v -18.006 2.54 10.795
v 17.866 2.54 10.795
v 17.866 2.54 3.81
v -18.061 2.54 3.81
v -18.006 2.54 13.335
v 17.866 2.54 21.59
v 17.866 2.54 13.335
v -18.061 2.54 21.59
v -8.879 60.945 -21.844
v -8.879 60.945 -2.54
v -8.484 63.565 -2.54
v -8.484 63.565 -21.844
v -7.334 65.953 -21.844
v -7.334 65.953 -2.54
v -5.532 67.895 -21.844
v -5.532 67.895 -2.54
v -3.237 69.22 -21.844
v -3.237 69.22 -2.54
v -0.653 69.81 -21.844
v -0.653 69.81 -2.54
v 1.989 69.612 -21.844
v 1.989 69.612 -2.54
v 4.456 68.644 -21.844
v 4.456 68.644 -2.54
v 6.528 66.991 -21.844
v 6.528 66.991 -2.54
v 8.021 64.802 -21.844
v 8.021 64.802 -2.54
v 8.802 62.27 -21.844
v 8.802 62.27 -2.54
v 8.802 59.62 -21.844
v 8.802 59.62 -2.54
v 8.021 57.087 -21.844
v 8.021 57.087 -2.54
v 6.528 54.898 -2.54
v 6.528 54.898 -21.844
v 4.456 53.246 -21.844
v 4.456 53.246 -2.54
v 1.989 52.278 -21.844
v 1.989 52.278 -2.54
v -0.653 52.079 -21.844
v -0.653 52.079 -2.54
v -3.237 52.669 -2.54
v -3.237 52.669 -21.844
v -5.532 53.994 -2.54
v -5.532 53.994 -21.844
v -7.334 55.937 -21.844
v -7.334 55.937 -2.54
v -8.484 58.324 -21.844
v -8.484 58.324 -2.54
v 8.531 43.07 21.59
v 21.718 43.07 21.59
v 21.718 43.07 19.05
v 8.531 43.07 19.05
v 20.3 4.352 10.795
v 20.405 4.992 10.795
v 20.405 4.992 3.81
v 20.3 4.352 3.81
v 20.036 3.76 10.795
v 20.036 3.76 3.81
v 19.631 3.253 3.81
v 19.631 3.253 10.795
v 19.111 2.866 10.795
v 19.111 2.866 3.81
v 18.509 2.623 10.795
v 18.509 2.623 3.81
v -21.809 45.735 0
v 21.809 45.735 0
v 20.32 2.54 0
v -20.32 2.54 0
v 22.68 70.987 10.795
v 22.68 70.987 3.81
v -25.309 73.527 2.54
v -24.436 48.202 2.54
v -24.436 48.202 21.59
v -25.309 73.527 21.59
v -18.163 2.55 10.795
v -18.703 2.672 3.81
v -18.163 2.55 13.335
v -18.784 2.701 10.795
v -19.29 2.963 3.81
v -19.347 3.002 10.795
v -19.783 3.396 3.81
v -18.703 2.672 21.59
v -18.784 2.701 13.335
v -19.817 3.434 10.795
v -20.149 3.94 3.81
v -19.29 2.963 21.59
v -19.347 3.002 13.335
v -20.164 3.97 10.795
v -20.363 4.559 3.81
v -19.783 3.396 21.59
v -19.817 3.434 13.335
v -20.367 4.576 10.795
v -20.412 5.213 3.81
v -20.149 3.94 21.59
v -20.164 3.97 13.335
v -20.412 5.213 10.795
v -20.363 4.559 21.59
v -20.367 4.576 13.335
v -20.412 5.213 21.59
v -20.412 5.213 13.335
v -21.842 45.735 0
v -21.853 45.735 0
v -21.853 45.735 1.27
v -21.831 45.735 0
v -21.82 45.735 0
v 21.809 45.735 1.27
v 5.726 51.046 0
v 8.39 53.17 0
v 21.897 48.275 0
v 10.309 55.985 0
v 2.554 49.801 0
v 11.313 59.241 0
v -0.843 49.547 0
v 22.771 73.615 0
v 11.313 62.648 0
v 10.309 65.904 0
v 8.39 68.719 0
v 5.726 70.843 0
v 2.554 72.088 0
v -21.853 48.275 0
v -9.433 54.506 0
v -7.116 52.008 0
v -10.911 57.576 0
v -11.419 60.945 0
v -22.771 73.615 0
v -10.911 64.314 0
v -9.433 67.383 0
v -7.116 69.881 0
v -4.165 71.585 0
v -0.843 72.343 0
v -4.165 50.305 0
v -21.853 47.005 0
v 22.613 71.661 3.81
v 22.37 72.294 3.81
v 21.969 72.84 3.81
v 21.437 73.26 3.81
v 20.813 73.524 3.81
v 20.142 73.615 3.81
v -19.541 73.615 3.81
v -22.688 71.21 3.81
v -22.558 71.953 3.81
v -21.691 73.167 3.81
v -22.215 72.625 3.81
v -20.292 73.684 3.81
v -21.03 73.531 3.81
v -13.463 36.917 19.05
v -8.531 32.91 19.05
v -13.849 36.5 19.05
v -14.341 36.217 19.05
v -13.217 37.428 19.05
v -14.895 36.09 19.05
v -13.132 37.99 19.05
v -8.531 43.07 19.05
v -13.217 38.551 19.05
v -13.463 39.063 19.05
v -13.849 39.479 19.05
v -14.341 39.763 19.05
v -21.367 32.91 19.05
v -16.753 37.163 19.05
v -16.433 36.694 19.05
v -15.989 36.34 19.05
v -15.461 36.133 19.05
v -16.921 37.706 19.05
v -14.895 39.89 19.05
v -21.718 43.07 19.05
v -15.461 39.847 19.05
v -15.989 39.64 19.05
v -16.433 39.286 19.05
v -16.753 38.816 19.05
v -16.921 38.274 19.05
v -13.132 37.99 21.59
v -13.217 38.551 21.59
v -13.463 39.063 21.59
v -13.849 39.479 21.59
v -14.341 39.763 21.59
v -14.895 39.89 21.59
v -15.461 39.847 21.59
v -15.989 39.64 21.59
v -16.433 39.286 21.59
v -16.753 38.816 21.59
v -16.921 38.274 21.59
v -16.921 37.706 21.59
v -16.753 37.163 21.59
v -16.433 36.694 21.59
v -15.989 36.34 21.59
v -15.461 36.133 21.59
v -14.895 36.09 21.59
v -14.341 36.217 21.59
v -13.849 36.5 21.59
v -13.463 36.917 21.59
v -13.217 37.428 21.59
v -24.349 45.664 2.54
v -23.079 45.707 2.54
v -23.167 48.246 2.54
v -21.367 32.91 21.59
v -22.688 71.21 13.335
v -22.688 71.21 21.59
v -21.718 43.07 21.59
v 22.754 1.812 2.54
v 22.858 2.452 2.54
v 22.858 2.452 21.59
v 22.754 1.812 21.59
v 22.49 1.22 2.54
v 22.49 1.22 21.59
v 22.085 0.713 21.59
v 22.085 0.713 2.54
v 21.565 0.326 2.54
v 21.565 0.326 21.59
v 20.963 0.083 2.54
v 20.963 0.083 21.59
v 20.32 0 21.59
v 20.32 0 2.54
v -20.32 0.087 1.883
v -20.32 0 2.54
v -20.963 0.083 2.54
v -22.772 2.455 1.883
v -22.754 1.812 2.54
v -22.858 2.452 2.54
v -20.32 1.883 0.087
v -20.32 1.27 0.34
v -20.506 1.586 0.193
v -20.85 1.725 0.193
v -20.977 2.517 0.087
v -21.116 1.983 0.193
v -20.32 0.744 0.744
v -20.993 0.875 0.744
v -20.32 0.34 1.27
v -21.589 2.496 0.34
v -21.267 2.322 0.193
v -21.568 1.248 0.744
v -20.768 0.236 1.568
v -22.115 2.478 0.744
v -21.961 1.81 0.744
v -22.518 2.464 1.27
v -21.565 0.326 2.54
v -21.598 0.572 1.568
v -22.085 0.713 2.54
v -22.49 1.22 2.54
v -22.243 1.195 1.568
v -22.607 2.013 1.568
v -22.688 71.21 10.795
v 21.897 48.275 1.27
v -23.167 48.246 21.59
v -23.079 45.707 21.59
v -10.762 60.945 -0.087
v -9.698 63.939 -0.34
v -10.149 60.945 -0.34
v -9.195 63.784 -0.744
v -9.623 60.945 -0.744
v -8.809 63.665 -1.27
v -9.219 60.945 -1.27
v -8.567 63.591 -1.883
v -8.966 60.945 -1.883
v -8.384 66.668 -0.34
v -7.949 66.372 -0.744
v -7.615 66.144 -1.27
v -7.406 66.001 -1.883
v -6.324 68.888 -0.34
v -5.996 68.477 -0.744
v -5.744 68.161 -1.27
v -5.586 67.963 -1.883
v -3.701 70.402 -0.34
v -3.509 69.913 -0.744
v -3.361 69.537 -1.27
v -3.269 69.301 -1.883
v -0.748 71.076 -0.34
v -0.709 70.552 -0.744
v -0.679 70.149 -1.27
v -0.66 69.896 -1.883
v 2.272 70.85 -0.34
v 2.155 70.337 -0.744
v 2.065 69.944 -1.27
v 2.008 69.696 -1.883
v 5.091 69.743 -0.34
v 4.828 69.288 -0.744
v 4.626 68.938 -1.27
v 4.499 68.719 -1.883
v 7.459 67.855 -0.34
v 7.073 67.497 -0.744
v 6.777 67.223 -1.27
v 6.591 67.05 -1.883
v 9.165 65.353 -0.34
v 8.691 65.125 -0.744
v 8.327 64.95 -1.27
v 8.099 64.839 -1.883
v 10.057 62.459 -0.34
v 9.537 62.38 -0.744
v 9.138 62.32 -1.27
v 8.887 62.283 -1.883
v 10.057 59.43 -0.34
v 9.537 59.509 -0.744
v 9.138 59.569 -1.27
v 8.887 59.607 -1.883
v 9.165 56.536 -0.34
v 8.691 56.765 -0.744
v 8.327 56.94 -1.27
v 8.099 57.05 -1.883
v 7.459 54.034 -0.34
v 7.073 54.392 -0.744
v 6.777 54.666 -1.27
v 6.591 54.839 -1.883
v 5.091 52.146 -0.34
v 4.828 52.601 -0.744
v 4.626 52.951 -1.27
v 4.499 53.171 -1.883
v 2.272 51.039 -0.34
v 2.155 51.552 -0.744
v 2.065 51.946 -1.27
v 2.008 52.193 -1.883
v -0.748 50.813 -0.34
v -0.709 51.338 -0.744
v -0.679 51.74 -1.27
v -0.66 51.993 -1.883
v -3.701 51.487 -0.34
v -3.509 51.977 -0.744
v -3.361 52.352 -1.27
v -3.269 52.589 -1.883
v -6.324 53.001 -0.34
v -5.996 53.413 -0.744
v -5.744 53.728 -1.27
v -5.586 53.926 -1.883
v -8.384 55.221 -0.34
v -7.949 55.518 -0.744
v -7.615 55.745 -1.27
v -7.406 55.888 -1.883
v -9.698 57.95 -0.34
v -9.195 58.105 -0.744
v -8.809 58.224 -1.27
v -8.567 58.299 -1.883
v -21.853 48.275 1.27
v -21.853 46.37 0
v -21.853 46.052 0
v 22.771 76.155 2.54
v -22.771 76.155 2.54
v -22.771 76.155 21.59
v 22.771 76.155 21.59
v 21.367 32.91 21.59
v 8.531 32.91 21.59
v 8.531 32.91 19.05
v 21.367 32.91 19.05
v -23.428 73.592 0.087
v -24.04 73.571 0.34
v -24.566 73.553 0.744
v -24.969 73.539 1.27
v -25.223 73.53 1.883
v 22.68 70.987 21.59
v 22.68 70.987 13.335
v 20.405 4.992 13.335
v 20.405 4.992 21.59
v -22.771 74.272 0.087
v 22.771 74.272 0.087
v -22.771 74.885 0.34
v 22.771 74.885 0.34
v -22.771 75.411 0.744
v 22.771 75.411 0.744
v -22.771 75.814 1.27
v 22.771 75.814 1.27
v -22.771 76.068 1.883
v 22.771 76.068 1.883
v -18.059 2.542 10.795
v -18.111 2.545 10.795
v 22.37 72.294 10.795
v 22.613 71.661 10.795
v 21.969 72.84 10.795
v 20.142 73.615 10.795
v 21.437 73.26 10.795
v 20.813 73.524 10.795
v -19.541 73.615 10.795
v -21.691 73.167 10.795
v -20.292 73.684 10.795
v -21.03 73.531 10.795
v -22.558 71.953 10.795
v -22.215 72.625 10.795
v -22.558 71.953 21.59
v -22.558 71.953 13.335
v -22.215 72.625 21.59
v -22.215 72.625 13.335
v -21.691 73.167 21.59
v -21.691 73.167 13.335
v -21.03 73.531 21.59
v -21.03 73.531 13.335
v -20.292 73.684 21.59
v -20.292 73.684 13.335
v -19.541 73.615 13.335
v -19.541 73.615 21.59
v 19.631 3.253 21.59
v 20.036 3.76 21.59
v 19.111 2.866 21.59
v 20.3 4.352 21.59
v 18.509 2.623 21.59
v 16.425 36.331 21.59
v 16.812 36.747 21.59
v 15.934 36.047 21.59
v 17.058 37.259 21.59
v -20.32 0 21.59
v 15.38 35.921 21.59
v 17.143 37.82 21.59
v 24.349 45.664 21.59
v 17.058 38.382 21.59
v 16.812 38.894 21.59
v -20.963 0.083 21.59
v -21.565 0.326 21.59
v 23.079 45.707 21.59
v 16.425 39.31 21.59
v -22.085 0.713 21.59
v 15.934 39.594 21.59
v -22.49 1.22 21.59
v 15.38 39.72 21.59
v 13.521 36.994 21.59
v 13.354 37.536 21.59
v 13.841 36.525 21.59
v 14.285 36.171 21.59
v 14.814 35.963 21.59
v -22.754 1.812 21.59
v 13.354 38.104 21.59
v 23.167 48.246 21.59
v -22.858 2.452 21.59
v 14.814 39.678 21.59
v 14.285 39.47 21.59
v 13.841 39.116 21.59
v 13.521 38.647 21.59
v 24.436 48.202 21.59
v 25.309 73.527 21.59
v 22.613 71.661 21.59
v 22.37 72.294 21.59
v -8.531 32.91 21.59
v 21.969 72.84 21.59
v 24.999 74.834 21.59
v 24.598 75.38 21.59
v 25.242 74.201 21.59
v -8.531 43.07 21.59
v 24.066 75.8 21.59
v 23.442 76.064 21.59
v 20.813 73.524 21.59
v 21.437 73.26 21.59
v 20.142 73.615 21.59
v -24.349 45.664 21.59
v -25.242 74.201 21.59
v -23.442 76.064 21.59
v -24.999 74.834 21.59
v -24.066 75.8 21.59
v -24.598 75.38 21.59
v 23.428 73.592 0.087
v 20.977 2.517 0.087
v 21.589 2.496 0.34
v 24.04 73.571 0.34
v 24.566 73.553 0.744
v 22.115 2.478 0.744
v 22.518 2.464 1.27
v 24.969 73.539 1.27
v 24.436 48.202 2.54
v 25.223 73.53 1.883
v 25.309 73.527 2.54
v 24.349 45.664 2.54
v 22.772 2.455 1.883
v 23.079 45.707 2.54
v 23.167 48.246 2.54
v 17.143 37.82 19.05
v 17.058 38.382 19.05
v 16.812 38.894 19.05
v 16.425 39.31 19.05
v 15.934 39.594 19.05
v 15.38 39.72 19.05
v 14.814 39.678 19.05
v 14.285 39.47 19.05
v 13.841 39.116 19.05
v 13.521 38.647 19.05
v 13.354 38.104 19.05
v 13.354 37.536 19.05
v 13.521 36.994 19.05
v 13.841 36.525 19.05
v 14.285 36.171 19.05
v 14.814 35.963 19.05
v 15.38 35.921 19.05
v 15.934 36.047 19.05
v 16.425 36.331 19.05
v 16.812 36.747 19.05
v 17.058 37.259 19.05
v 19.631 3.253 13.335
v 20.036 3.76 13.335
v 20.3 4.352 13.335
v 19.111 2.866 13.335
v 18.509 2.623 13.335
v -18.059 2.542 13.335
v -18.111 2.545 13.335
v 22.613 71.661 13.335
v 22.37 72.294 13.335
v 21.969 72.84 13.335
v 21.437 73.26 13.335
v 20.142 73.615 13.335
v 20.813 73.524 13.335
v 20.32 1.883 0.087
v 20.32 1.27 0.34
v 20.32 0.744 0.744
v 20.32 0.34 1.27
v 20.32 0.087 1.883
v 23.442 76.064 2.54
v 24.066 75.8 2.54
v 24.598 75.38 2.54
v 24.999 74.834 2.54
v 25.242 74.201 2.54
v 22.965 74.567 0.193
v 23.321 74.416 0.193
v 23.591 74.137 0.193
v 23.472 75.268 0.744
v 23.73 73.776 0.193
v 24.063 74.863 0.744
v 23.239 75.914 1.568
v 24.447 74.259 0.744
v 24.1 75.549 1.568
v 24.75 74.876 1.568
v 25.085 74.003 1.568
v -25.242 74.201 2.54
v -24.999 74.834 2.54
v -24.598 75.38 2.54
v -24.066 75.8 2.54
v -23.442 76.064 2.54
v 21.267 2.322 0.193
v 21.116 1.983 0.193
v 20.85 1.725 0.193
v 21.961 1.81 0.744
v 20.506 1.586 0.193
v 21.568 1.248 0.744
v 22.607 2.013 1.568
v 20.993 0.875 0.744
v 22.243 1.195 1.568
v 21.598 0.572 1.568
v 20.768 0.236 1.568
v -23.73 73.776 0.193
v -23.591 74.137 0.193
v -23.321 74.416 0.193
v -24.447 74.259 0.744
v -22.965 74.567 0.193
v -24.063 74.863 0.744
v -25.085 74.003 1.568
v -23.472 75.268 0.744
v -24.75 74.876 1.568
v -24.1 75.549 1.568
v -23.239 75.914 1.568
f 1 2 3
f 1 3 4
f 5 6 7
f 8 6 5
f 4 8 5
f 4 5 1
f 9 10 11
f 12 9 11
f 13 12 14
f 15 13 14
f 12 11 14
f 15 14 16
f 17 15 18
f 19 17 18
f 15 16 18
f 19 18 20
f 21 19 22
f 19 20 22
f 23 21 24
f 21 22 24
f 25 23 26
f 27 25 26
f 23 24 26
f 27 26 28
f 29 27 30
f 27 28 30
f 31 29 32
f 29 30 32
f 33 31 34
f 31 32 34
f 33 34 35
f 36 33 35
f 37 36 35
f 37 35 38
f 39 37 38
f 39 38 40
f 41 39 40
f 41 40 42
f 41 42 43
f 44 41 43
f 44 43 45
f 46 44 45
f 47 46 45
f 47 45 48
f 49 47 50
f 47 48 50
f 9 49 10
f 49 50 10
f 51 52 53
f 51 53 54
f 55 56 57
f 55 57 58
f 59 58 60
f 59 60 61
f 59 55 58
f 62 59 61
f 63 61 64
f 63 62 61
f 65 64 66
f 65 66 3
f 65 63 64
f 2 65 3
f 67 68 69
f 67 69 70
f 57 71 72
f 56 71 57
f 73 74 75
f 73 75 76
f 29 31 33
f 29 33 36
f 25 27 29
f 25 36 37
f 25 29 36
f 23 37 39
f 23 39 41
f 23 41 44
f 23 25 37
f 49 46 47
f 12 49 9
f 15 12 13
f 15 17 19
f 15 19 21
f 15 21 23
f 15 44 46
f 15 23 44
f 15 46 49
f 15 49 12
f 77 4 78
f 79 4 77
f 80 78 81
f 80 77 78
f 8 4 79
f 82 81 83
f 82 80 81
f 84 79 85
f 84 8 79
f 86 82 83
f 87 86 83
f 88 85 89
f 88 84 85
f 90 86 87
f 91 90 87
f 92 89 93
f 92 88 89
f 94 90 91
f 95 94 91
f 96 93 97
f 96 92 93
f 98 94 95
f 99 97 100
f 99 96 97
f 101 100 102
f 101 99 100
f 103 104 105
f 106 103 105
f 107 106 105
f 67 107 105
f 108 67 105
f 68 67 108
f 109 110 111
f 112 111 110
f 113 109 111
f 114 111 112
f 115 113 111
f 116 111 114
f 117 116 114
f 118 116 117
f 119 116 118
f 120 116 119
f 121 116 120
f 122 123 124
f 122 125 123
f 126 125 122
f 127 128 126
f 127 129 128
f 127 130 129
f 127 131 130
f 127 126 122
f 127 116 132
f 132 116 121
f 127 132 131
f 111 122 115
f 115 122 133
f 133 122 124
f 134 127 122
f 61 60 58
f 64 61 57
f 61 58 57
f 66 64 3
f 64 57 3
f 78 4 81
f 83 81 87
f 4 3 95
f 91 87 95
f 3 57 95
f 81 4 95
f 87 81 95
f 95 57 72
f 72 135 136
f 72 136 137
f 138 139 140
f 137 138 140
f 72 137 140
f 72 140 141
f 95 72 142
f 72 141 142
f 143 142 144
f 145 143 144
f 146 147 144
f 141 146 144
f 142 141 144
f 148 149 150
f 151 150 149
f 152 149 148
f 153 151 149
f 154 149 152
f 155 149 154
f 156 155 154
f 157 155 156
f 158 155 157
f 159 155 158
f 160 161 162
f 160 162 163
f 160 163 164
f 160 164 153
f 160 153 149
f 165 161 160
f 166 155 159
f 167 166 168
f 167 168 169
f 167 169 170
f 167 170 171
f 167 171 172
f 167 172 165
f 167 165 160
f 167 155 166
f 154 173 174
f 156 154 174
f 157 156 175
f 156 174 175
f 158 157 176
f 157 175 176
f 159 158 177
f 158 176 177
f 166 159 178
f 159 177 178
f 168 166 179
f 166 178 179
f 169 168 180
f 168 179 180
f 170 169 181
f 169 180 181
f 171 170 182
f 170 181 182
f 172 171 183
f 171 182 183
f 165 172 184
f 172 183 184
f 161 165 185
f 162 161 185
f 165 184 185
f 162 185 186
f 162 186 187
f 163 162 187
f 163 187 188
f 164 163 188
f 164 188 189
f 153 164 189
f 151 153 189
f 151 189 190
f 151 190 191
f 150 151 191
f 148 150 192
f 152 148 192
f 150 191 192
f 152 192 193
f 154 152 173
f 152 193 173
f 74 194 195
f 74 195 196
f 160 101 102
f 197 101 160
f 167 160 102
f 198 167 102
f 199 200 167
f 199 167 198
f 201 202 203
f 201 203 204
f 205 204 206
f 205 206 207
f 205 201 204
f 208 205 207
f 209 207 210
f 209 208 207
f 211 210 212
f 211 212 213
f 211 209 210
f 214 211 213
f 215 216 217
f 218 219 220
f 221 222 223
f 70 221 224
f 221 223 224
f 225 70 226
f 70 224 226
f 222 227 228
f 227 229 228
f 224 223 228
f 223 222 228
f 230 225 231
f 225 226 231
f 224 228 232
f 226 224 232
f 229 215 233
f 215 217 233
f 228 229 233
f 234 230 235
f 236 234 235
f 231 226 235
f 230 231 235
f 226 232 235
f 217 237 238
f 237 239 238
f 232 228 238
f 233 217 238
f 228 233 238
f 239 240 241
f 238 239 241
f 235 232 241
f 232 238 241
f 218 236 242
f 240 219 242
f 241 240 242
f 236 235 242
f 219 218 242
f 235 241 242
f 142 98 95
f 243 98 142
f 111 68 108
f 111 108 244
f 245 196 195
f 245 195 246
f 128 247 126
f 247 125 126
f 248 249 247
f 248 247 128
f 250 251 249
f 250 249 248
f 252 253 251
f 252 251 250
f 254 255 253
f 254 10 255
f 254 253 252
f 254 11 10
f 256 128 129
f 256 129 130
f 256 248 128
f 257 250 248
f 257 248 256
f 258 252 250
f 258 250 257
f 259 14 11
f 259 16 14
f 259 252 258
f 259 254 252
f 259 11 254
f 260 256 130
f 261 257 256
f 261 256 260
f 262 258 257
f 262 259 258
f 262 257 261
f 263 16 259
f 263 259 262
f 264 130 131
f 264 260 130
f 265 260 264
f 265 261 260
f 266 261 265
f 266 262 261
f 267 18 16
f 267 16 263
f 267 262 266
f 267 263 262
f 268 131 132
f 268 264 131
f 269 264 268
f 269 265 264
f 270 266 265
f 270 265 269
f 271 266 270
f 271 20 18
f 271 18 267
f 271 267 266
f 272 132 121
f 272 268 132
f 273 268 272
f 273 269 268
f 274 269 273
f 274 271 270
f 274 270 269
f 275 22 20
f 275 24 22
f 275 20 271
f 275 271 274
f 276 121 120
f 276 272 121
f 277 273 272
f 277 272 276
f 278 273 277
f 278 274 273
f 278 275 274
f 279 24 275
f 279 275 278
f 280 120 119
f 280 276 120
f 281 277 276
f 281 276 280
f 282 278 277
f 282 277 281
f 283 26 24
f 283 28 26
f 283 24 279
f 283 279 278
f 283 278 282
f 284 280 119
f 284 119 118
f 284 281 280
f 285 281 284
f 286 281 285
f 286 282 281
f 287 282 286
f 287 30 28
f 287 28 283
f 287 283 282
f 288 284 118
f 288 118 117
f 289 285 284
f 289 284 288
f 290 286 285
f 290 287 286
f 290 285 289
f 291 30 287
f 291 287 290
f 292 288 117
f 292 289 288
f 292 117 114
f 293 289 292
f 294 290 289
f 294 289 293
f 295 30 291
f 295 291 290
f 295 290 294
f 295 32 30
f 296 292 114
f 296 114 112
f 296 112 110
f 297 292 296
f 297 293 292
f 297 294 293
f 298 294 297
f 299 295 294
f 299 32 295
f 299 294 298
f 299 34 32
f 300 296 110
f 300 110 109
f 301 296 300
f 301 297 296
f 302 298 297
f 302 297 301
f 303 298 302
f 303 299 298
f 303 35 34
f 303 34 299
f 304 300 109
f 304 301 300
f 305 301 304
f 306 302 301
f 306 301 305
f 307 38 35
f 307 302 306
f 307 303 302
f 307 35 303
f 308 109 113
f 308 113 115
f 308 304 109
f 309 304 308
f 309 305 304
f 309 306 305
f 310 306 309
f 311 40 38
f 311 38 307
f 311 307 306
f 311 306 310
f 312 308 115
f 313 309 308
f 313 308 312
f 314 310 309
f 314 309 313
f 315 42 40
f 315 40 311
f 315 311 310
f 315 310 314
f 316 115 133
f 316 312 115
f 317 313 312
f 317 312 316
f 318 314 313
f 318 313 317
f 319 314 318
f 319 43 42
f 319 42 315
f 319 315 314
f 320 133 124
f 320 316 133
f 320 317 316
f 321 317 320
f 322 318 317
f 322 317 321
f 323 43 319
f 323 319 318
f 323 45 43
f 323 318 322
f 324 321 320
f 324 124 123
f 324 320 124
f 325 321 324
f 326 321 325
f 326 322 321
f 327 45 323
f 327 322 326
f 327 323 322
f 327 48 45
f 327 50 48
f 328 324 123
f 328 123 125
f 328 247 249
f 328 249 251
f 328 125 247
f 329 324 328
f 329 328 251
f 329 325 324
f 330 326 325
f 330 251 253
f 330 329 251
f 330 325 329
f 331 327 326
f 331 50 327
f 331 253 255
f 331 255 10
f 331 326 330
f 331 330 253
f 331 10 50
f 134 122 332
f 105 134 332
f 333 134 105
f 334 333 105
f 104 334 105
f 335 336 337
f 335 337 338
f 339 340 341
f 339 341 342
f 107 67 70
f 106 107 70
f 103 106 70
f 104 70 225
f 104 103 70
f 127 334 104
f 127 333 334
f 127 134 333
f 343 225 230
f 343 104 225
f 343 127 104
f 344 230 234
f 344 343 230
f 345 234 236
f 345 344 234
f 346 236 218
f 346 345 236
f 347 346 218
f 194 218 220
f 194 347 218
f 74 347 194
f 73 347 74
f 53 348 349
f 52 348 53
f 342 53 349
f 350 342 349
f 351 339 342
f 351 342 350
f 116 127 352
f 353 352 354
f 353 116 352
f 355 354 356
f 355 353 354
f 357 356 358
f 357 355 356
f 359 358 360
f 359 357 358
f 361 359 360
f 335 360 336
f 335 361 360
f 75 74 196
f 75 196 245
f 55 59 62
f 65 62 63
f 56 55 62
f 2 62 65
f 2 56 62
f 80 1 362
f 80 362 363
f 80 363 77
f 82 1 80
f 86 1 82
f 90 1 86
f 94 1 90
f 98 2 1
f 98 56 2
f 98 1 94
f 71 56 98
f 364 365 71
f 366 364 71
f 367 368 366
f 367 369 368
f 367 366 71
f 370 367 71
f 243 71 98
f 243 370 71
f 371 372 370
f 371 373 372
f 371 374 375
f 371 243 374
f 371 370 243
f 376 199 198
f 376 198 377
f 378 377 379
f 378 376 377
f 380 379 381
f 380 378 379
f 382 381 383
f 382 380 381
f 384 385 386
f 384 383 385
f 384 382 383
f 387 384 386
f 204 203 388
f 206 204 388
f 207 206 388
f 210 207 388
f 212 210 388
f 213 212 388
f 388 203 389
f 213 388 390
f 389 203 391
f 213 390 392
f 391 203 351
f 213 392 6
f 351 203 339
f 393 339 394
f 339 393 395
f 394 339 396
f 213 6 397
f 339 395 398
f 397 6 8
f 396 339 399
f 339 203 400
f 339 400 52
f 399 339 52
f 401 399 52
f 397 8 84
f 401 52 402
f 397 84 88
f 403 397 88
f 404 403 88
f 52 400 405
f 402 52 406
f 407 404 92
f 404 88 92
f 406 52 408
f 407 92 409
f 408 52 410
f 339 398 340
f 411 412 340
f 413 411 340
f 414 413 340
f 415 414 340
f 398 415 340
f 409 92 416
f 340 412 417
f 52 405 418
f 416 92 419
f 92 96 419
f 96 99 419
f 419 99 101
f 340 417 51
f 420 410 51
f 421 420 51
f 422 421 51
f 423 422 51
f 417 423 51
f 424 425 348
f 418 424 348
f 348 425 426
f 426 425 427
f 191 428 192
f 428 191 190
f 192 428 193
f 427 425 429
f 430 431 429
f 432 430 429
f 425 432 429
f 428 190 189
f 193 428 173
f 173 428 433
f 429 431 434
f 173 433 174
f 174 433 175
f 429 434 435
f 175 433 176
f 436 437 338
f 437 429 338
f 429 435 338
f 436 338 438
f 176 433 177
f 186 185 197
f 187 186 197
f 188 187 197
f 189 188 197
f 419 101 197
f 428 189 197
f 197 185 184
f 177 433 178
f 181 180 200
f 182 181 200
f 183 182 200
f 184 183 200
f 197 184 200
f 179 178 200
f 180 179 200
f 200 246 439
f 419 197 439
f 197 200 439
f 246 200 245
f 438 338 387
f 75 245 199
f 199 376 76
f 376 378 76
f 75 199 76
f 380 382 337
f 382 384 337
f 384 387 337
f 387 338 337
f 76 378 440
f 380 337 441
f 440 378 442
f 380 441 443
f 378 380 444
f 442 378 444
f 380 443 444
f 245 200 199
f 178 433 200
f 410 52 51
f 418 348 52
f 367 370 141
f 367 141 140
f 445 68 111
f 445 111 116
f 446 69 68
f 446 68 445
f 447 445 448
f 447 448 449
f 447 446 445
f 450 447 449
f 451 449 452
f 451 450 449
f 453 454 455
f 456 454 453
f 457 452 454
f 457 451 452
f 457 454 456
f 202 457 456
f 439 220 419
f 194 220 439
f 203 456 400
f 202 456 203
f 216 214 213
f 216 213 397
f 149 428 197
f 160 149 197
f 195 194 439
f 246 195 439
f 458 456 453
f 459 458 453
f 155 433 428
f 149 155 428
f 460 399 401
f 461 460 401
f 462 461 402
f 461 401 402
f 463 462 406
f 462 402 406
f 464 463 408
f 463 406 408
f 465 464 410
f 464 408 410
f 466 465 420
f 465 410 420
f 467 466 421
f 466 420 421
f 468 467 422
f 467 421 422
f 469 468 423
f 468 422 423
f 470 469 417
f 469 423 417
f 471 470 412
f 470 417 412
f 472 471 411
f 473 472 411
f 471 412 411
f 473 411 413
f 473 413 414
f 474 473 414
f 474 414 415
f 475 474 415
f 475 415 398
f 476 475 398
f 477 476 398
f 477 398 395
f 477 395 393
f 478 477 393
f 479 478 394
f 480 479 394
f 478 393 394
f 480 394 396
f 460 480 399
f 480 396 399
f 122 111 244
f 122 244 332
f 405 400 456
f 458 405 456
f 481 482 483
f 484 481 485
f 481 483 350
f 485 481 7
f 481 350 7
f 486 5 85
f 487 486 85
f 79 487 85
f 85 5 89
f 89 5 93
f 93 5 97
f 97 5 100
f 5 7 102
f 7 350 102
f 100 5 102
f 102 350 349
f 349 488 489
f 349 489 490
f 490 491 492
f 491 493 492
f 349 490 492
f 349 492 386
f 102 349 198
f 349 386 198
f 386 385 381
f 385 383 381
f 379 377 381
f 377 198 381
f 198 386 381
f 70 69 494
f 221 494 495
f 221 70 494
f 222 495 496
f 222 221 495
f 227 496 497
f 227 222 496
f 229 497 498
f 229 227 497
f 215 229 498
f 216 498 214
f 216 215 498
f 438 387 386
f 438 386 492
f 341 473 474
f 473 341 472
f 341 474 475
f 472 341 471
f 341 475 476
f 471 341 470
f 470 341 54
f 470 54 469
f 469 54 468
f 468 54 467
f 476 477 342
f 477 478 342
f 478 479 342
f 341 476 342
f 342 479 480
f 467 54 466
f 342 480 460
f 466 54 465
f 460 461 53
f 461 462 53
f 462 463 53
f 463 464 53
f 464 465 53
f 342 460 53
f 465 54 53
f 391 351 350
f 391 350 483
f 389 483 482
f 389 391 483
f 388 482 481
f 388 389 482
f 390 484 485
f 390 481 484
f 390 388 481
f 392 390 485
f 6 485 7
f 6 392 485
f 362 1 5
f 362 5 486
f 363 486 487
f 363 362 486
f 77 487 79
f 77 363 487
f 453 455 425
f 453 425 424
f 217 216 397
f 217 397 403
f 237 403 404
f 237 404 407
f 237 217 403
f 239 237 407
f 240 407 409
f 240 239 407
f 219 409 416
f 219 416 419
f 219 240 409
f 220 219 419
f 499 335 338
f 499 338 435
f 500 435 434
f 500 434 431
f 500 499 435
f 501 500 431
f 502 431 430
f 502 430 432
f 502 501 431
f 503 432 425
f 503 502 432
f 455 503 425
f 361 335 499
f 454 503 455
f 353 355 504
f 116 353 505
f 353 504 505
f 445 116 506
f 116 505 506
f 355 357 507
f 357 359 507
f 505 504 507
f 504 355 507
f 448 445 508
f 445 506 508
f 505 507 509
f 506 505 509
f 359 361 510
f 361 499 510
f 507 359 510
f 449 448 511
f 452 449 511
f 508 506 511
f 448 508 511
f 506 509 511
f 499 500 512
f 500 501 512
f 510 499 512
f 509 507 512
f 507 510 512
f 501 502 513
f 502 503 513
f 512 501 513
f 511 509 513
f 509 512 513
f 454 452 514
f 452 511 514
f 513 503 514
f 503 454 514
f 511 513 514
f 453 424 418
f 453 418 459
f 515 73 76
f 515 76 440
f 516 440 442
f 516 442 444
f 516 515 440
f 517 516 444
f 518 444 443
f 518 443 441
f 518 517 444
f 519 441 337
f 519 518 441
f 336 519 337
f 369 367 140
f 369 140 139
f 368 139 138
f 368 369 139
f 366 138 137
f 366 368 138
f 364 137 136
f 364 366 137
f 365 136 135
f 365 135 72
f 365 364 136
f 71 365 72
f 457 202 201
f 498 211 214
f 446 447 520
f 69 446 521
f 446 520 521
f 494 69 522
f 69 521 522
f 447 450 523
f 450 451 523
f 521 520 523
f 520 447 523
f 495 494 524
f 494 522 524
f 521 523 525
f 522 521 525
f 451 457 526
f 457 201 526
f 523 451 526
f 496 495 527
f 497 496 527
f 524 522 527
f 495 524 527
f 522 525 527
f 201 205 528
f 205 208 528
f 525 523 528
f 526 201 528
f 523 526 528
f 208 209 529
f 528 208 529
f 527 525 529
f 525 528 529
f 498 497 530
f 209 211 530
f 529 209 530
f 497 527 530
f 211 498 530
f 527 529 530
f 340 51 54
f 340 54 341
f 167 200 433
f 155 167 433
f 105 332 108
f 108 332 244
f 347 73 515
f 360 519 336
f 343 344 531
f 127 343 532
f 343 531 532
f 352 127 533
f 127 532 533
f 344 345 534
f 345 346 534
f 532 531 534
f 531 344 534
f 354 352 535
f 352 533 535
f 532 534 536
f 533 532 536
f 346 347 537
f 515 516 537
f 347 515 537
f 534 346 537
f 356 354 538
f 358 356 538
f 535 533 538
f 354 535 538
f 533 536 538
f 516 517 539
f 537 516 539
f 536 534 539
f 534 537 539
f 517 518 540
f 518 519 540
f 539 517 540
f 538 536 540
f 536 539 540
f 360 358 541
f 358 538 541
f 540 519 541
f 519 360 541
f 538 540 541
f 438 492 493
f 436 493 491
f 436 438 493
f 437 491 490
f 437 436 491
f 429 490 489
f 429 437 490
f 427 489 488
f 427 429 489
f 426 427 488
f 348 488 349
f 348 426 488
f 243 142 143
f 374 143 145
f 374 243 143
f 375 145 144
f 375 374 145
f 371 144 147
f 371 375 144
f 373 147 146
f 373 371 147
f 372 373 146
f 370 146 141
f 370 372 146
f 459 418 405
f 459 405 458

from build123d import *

# Parameters (mm, degrees)
BOSS_EXTRUDE2_DEPTH = 21.59
CUT_EXTRUDE1_DEPTH  = 17.78
BOSS_EXTRUDE4_DEPTH = 2.54
SKETCH8_R           = 1.905
CUT_EXTRUDE2_DEPTH  = 2.54
BOSS_EXTRUDE6_DEPTH = 2.54
FILLET1_R           = 2.54
SKETCH13_W          = 19.05
SKETCH13_H          = 2.54
CUT_EXTRUDE5_DEPTH  = 1.27
CUT_EXTRUDE6_DEPTH  = 1.27
SKETCH16_W          = 19.05
SKETCH16_H          = 2.54
CUT_EXTRUDE7_DEPTH  = 1.27
SKETCH17_R          = 8.89
BOSS_EXTRUDE7_DEPTH = 21.844
FILLET2_R           = 2.54


with BuildPart() as part:
    # Sketch3 → Boss-Extrude2 (new body)
    with BuildSketch(Plane.XY):
        with BuildLine():
            Line((-22.77090231, 76.154735329), (22.77090231, 76.154735329))
            ThreePointArc((22.77090231, 76.154735329), (24.597640016, 75.379566583), (25.309393487, 73.527199387))
            Line((25.309393487, 73.527199387), (22.858491178, 2.452464058))
            ThreePointArc((22.858491178, 2.452464058), (22.084831254, 0.713262294), (20.32, 0))
            Line((20.32, 0), (-20.32, 0))
            ThreePointArc((-20.32, 0), (-22.084831254, 0.713262294), (-22.858491178, 2.452464058))
            Line((-22.858491178, 2.452464058), (-25.309393487, 73.527199387))
            ThreePointArc((-25.309393487, 73.527199387), (-24.597640016, 75.379566583), (-22.77090231, 76.154735329))
        make_face()
    extrude(amount=BOSS_EXTRUDE2_DEPTH)

    # Sketch4 → Cut-Extrude1 (cut)
    with BuildSketch(Plane.XY.offset(21.59)):
        with BuildLine():
            Line((-19.541270744, 73.614735329), (20.141804619, 73.614735329))
            ThreePointArc((20.141804619, 73.614735329), (21.968542325, 72.839566583), (22.680295797, 70.987199387))
            Line((22.680295797, 70.987199387), (20.404569365, 4.992462187))
            ThreePointArc((20.404569365, 4.992462187), (19.630909441, 3.253260423), (17.866078187, 2.539998129))
            Line((17.866078187, 2.539998129), (-18.061159176, 2.539998129))
            ThreePointArc((-18.061159176, 2.539998129), (-19.78310781, 3.39559701), (-20.412160003, 5.212586245))
            Line((-20.412160003, 5.212586245), (-22.687990425, 71.210339105))
            ThreePointArc((-22.687990425, 71.210339105), (-21.690891162, 73.166710129), (-19.541270744, 73.614735329))
        make_face()
    extrude(amount=-CUT_EXTRUDE1_DEPTH, mode=Mode.SUBTRACT)

    # Sketch7 → Boss-Extrude4 (add)
    with BuildSketch(Plane.XY.offset(21.59)):
        Polygon((-21.717608556, 43.069831723), (-8.531459132, 43.069831723), (-8.531459132, 32.909831723), (-21.367256671, 32.909831723), align=None)
        Polygon((8.531459132, 32.909831723), (21.367256671, 32.909831723), (21.717608556, 43.069831723), (8.531459132, 43.069831723), align=None)
    extrude(amount=-BOSS_EXTRUDE4_DEPTH)

    # Sketch8 → Cut-Extrude2 (cut)
    with BuildSketch(Plane.XY.offset(21.59)):
        with Locations((-15.036945873, 37.989831723)):
            Circle(SKETCH8_R)
        with Locations((15.237744036, 37.820383377)):
            Circle(SKETCH8_R)
    extrude(amount=-CUT_EXTRUDE2_DEPTH, mode=Mode.SUBTRACT)

    # Sketch10 → Boss-Extrude6 (add)
    with BuildSketch(Plane.XY.offset(10.795)):
        with BuildLine():
            Line((-19.48633529, 73.614735329), (20.196740073, 73.614735329))
            ThreePointArc((20.196740073, 73.614735329), (22.023477783, 72.839566579), (22.73523125, 70.987199377))
            Line((22.73523125, 70.987199377), (20.459504542, 4.992462177))
            ThreePointArc((20.459504542, 4.992462177), (19.685844615, 3.253260419), (17.921013365, 2.539998129))
            Line((17.921013365, 2.539998129), (-18.006223999, 2.539998129))
            ThreePointArc((-18.006223999, 2.539998129), (-19.816312644, 3.37520138), (-20.468700556, 5.258914571))
            Line((-20.468700556, 5.258914571), (-22.744530979, 71.256667431))
            ThreePointArc((-22.744530979, 71.256667431), (-21.694916693, 73.236386905), (-19.48633529, 73.614735329))
        make_face()
    extrude(amount=BOSS_EXTRUDE6_DEPTH)

    # Fillet1
    fillet1_edges = [part.edges().sort_by_distance(p)[0] for p in [
        (24.083942332, 37.989831723, 0),
        (22.084831254, 0.713262294, 0),
        (0, 0, 0),
        (-22.084831254, 0.713262294, 0),
        (-24.083942332, 37.989831723, 0),
        (-24.597640016, 75.379566583, 0),
        (0, 76.154735329, 0),
        (24.597640016, 75.379566583, 0),
    ]]
    fillet(fillet1_edges, radius=FILLET1_R)

    # Sketch13 → Cut-Extrude5 (cut)
    with BuildSketch(Plane(origin=(22.746873247, -0.784390739, 0), x_dir=(0, 0, -1), z_dir=(0.999405975, -0.034462969, 0))):
        with Locations((-12.065, 47.745550873)):
            Rectangle(SKETCH13_W, SKETCH13_H)
    extrude(amount=-CUT_EXTRUDE5_DEPTH, mode=Mode.SUBTRACT)

    # Sketch14 → Cut-Extrude6 (cut)
    with BuildSketch(Plane(origin=(0, 0, 0), x_dir=(-1, 0, 0), z_dir=(0, 0, -1))):
        Polygon((-21.897084419, 48.274526929), (21.853290434, 48.274526929), (21.853290434, 45.734526929), (-21.809496448, 45.734526929), align=None)
    extrude(amount=-CUT_EXTRUDE6_DEPTH, mode=Mode.SUBTRACT)

    # Sketch16 → Cut-Extrude7 (cut)
    with BuildSketch(Plane(origin=(-22.746873247, -0.784390739, 0), x_dir=(0, 0, 1), z_dir=(-0.999405975, -0.034462969, 0))):
        with Locations((12.065, 47.745550873)):
            Rectangle(SKETCH16_W, SKETCH16_H)
    extrude(amount=-CUT_EXTRUDE7_DEPTH, mode=Mode.SUBTRACT)

    # Sketch17 → Boss-Extrude7 (add)
    with BuildSketch(Plane(origin=(0, 0, 0), x_dir=(-1, 0, 0), z_dir=(0, 0, -1))):
        with Locations((-0.010948496, 60.944631129)):
            Circle(SKETCH17_R)
    extrude(amount=BOSS_EXTRUDE7_DEPTH)

    # Fillet2
    fillet2_edges = [part.edges().sort_by_distance(p)[0] for p in [
        (8.900948496, 60.944631129, 0),
    ]]
    fillet(fillet2_edges, radius=FILLET2_R)


solid = part.part
